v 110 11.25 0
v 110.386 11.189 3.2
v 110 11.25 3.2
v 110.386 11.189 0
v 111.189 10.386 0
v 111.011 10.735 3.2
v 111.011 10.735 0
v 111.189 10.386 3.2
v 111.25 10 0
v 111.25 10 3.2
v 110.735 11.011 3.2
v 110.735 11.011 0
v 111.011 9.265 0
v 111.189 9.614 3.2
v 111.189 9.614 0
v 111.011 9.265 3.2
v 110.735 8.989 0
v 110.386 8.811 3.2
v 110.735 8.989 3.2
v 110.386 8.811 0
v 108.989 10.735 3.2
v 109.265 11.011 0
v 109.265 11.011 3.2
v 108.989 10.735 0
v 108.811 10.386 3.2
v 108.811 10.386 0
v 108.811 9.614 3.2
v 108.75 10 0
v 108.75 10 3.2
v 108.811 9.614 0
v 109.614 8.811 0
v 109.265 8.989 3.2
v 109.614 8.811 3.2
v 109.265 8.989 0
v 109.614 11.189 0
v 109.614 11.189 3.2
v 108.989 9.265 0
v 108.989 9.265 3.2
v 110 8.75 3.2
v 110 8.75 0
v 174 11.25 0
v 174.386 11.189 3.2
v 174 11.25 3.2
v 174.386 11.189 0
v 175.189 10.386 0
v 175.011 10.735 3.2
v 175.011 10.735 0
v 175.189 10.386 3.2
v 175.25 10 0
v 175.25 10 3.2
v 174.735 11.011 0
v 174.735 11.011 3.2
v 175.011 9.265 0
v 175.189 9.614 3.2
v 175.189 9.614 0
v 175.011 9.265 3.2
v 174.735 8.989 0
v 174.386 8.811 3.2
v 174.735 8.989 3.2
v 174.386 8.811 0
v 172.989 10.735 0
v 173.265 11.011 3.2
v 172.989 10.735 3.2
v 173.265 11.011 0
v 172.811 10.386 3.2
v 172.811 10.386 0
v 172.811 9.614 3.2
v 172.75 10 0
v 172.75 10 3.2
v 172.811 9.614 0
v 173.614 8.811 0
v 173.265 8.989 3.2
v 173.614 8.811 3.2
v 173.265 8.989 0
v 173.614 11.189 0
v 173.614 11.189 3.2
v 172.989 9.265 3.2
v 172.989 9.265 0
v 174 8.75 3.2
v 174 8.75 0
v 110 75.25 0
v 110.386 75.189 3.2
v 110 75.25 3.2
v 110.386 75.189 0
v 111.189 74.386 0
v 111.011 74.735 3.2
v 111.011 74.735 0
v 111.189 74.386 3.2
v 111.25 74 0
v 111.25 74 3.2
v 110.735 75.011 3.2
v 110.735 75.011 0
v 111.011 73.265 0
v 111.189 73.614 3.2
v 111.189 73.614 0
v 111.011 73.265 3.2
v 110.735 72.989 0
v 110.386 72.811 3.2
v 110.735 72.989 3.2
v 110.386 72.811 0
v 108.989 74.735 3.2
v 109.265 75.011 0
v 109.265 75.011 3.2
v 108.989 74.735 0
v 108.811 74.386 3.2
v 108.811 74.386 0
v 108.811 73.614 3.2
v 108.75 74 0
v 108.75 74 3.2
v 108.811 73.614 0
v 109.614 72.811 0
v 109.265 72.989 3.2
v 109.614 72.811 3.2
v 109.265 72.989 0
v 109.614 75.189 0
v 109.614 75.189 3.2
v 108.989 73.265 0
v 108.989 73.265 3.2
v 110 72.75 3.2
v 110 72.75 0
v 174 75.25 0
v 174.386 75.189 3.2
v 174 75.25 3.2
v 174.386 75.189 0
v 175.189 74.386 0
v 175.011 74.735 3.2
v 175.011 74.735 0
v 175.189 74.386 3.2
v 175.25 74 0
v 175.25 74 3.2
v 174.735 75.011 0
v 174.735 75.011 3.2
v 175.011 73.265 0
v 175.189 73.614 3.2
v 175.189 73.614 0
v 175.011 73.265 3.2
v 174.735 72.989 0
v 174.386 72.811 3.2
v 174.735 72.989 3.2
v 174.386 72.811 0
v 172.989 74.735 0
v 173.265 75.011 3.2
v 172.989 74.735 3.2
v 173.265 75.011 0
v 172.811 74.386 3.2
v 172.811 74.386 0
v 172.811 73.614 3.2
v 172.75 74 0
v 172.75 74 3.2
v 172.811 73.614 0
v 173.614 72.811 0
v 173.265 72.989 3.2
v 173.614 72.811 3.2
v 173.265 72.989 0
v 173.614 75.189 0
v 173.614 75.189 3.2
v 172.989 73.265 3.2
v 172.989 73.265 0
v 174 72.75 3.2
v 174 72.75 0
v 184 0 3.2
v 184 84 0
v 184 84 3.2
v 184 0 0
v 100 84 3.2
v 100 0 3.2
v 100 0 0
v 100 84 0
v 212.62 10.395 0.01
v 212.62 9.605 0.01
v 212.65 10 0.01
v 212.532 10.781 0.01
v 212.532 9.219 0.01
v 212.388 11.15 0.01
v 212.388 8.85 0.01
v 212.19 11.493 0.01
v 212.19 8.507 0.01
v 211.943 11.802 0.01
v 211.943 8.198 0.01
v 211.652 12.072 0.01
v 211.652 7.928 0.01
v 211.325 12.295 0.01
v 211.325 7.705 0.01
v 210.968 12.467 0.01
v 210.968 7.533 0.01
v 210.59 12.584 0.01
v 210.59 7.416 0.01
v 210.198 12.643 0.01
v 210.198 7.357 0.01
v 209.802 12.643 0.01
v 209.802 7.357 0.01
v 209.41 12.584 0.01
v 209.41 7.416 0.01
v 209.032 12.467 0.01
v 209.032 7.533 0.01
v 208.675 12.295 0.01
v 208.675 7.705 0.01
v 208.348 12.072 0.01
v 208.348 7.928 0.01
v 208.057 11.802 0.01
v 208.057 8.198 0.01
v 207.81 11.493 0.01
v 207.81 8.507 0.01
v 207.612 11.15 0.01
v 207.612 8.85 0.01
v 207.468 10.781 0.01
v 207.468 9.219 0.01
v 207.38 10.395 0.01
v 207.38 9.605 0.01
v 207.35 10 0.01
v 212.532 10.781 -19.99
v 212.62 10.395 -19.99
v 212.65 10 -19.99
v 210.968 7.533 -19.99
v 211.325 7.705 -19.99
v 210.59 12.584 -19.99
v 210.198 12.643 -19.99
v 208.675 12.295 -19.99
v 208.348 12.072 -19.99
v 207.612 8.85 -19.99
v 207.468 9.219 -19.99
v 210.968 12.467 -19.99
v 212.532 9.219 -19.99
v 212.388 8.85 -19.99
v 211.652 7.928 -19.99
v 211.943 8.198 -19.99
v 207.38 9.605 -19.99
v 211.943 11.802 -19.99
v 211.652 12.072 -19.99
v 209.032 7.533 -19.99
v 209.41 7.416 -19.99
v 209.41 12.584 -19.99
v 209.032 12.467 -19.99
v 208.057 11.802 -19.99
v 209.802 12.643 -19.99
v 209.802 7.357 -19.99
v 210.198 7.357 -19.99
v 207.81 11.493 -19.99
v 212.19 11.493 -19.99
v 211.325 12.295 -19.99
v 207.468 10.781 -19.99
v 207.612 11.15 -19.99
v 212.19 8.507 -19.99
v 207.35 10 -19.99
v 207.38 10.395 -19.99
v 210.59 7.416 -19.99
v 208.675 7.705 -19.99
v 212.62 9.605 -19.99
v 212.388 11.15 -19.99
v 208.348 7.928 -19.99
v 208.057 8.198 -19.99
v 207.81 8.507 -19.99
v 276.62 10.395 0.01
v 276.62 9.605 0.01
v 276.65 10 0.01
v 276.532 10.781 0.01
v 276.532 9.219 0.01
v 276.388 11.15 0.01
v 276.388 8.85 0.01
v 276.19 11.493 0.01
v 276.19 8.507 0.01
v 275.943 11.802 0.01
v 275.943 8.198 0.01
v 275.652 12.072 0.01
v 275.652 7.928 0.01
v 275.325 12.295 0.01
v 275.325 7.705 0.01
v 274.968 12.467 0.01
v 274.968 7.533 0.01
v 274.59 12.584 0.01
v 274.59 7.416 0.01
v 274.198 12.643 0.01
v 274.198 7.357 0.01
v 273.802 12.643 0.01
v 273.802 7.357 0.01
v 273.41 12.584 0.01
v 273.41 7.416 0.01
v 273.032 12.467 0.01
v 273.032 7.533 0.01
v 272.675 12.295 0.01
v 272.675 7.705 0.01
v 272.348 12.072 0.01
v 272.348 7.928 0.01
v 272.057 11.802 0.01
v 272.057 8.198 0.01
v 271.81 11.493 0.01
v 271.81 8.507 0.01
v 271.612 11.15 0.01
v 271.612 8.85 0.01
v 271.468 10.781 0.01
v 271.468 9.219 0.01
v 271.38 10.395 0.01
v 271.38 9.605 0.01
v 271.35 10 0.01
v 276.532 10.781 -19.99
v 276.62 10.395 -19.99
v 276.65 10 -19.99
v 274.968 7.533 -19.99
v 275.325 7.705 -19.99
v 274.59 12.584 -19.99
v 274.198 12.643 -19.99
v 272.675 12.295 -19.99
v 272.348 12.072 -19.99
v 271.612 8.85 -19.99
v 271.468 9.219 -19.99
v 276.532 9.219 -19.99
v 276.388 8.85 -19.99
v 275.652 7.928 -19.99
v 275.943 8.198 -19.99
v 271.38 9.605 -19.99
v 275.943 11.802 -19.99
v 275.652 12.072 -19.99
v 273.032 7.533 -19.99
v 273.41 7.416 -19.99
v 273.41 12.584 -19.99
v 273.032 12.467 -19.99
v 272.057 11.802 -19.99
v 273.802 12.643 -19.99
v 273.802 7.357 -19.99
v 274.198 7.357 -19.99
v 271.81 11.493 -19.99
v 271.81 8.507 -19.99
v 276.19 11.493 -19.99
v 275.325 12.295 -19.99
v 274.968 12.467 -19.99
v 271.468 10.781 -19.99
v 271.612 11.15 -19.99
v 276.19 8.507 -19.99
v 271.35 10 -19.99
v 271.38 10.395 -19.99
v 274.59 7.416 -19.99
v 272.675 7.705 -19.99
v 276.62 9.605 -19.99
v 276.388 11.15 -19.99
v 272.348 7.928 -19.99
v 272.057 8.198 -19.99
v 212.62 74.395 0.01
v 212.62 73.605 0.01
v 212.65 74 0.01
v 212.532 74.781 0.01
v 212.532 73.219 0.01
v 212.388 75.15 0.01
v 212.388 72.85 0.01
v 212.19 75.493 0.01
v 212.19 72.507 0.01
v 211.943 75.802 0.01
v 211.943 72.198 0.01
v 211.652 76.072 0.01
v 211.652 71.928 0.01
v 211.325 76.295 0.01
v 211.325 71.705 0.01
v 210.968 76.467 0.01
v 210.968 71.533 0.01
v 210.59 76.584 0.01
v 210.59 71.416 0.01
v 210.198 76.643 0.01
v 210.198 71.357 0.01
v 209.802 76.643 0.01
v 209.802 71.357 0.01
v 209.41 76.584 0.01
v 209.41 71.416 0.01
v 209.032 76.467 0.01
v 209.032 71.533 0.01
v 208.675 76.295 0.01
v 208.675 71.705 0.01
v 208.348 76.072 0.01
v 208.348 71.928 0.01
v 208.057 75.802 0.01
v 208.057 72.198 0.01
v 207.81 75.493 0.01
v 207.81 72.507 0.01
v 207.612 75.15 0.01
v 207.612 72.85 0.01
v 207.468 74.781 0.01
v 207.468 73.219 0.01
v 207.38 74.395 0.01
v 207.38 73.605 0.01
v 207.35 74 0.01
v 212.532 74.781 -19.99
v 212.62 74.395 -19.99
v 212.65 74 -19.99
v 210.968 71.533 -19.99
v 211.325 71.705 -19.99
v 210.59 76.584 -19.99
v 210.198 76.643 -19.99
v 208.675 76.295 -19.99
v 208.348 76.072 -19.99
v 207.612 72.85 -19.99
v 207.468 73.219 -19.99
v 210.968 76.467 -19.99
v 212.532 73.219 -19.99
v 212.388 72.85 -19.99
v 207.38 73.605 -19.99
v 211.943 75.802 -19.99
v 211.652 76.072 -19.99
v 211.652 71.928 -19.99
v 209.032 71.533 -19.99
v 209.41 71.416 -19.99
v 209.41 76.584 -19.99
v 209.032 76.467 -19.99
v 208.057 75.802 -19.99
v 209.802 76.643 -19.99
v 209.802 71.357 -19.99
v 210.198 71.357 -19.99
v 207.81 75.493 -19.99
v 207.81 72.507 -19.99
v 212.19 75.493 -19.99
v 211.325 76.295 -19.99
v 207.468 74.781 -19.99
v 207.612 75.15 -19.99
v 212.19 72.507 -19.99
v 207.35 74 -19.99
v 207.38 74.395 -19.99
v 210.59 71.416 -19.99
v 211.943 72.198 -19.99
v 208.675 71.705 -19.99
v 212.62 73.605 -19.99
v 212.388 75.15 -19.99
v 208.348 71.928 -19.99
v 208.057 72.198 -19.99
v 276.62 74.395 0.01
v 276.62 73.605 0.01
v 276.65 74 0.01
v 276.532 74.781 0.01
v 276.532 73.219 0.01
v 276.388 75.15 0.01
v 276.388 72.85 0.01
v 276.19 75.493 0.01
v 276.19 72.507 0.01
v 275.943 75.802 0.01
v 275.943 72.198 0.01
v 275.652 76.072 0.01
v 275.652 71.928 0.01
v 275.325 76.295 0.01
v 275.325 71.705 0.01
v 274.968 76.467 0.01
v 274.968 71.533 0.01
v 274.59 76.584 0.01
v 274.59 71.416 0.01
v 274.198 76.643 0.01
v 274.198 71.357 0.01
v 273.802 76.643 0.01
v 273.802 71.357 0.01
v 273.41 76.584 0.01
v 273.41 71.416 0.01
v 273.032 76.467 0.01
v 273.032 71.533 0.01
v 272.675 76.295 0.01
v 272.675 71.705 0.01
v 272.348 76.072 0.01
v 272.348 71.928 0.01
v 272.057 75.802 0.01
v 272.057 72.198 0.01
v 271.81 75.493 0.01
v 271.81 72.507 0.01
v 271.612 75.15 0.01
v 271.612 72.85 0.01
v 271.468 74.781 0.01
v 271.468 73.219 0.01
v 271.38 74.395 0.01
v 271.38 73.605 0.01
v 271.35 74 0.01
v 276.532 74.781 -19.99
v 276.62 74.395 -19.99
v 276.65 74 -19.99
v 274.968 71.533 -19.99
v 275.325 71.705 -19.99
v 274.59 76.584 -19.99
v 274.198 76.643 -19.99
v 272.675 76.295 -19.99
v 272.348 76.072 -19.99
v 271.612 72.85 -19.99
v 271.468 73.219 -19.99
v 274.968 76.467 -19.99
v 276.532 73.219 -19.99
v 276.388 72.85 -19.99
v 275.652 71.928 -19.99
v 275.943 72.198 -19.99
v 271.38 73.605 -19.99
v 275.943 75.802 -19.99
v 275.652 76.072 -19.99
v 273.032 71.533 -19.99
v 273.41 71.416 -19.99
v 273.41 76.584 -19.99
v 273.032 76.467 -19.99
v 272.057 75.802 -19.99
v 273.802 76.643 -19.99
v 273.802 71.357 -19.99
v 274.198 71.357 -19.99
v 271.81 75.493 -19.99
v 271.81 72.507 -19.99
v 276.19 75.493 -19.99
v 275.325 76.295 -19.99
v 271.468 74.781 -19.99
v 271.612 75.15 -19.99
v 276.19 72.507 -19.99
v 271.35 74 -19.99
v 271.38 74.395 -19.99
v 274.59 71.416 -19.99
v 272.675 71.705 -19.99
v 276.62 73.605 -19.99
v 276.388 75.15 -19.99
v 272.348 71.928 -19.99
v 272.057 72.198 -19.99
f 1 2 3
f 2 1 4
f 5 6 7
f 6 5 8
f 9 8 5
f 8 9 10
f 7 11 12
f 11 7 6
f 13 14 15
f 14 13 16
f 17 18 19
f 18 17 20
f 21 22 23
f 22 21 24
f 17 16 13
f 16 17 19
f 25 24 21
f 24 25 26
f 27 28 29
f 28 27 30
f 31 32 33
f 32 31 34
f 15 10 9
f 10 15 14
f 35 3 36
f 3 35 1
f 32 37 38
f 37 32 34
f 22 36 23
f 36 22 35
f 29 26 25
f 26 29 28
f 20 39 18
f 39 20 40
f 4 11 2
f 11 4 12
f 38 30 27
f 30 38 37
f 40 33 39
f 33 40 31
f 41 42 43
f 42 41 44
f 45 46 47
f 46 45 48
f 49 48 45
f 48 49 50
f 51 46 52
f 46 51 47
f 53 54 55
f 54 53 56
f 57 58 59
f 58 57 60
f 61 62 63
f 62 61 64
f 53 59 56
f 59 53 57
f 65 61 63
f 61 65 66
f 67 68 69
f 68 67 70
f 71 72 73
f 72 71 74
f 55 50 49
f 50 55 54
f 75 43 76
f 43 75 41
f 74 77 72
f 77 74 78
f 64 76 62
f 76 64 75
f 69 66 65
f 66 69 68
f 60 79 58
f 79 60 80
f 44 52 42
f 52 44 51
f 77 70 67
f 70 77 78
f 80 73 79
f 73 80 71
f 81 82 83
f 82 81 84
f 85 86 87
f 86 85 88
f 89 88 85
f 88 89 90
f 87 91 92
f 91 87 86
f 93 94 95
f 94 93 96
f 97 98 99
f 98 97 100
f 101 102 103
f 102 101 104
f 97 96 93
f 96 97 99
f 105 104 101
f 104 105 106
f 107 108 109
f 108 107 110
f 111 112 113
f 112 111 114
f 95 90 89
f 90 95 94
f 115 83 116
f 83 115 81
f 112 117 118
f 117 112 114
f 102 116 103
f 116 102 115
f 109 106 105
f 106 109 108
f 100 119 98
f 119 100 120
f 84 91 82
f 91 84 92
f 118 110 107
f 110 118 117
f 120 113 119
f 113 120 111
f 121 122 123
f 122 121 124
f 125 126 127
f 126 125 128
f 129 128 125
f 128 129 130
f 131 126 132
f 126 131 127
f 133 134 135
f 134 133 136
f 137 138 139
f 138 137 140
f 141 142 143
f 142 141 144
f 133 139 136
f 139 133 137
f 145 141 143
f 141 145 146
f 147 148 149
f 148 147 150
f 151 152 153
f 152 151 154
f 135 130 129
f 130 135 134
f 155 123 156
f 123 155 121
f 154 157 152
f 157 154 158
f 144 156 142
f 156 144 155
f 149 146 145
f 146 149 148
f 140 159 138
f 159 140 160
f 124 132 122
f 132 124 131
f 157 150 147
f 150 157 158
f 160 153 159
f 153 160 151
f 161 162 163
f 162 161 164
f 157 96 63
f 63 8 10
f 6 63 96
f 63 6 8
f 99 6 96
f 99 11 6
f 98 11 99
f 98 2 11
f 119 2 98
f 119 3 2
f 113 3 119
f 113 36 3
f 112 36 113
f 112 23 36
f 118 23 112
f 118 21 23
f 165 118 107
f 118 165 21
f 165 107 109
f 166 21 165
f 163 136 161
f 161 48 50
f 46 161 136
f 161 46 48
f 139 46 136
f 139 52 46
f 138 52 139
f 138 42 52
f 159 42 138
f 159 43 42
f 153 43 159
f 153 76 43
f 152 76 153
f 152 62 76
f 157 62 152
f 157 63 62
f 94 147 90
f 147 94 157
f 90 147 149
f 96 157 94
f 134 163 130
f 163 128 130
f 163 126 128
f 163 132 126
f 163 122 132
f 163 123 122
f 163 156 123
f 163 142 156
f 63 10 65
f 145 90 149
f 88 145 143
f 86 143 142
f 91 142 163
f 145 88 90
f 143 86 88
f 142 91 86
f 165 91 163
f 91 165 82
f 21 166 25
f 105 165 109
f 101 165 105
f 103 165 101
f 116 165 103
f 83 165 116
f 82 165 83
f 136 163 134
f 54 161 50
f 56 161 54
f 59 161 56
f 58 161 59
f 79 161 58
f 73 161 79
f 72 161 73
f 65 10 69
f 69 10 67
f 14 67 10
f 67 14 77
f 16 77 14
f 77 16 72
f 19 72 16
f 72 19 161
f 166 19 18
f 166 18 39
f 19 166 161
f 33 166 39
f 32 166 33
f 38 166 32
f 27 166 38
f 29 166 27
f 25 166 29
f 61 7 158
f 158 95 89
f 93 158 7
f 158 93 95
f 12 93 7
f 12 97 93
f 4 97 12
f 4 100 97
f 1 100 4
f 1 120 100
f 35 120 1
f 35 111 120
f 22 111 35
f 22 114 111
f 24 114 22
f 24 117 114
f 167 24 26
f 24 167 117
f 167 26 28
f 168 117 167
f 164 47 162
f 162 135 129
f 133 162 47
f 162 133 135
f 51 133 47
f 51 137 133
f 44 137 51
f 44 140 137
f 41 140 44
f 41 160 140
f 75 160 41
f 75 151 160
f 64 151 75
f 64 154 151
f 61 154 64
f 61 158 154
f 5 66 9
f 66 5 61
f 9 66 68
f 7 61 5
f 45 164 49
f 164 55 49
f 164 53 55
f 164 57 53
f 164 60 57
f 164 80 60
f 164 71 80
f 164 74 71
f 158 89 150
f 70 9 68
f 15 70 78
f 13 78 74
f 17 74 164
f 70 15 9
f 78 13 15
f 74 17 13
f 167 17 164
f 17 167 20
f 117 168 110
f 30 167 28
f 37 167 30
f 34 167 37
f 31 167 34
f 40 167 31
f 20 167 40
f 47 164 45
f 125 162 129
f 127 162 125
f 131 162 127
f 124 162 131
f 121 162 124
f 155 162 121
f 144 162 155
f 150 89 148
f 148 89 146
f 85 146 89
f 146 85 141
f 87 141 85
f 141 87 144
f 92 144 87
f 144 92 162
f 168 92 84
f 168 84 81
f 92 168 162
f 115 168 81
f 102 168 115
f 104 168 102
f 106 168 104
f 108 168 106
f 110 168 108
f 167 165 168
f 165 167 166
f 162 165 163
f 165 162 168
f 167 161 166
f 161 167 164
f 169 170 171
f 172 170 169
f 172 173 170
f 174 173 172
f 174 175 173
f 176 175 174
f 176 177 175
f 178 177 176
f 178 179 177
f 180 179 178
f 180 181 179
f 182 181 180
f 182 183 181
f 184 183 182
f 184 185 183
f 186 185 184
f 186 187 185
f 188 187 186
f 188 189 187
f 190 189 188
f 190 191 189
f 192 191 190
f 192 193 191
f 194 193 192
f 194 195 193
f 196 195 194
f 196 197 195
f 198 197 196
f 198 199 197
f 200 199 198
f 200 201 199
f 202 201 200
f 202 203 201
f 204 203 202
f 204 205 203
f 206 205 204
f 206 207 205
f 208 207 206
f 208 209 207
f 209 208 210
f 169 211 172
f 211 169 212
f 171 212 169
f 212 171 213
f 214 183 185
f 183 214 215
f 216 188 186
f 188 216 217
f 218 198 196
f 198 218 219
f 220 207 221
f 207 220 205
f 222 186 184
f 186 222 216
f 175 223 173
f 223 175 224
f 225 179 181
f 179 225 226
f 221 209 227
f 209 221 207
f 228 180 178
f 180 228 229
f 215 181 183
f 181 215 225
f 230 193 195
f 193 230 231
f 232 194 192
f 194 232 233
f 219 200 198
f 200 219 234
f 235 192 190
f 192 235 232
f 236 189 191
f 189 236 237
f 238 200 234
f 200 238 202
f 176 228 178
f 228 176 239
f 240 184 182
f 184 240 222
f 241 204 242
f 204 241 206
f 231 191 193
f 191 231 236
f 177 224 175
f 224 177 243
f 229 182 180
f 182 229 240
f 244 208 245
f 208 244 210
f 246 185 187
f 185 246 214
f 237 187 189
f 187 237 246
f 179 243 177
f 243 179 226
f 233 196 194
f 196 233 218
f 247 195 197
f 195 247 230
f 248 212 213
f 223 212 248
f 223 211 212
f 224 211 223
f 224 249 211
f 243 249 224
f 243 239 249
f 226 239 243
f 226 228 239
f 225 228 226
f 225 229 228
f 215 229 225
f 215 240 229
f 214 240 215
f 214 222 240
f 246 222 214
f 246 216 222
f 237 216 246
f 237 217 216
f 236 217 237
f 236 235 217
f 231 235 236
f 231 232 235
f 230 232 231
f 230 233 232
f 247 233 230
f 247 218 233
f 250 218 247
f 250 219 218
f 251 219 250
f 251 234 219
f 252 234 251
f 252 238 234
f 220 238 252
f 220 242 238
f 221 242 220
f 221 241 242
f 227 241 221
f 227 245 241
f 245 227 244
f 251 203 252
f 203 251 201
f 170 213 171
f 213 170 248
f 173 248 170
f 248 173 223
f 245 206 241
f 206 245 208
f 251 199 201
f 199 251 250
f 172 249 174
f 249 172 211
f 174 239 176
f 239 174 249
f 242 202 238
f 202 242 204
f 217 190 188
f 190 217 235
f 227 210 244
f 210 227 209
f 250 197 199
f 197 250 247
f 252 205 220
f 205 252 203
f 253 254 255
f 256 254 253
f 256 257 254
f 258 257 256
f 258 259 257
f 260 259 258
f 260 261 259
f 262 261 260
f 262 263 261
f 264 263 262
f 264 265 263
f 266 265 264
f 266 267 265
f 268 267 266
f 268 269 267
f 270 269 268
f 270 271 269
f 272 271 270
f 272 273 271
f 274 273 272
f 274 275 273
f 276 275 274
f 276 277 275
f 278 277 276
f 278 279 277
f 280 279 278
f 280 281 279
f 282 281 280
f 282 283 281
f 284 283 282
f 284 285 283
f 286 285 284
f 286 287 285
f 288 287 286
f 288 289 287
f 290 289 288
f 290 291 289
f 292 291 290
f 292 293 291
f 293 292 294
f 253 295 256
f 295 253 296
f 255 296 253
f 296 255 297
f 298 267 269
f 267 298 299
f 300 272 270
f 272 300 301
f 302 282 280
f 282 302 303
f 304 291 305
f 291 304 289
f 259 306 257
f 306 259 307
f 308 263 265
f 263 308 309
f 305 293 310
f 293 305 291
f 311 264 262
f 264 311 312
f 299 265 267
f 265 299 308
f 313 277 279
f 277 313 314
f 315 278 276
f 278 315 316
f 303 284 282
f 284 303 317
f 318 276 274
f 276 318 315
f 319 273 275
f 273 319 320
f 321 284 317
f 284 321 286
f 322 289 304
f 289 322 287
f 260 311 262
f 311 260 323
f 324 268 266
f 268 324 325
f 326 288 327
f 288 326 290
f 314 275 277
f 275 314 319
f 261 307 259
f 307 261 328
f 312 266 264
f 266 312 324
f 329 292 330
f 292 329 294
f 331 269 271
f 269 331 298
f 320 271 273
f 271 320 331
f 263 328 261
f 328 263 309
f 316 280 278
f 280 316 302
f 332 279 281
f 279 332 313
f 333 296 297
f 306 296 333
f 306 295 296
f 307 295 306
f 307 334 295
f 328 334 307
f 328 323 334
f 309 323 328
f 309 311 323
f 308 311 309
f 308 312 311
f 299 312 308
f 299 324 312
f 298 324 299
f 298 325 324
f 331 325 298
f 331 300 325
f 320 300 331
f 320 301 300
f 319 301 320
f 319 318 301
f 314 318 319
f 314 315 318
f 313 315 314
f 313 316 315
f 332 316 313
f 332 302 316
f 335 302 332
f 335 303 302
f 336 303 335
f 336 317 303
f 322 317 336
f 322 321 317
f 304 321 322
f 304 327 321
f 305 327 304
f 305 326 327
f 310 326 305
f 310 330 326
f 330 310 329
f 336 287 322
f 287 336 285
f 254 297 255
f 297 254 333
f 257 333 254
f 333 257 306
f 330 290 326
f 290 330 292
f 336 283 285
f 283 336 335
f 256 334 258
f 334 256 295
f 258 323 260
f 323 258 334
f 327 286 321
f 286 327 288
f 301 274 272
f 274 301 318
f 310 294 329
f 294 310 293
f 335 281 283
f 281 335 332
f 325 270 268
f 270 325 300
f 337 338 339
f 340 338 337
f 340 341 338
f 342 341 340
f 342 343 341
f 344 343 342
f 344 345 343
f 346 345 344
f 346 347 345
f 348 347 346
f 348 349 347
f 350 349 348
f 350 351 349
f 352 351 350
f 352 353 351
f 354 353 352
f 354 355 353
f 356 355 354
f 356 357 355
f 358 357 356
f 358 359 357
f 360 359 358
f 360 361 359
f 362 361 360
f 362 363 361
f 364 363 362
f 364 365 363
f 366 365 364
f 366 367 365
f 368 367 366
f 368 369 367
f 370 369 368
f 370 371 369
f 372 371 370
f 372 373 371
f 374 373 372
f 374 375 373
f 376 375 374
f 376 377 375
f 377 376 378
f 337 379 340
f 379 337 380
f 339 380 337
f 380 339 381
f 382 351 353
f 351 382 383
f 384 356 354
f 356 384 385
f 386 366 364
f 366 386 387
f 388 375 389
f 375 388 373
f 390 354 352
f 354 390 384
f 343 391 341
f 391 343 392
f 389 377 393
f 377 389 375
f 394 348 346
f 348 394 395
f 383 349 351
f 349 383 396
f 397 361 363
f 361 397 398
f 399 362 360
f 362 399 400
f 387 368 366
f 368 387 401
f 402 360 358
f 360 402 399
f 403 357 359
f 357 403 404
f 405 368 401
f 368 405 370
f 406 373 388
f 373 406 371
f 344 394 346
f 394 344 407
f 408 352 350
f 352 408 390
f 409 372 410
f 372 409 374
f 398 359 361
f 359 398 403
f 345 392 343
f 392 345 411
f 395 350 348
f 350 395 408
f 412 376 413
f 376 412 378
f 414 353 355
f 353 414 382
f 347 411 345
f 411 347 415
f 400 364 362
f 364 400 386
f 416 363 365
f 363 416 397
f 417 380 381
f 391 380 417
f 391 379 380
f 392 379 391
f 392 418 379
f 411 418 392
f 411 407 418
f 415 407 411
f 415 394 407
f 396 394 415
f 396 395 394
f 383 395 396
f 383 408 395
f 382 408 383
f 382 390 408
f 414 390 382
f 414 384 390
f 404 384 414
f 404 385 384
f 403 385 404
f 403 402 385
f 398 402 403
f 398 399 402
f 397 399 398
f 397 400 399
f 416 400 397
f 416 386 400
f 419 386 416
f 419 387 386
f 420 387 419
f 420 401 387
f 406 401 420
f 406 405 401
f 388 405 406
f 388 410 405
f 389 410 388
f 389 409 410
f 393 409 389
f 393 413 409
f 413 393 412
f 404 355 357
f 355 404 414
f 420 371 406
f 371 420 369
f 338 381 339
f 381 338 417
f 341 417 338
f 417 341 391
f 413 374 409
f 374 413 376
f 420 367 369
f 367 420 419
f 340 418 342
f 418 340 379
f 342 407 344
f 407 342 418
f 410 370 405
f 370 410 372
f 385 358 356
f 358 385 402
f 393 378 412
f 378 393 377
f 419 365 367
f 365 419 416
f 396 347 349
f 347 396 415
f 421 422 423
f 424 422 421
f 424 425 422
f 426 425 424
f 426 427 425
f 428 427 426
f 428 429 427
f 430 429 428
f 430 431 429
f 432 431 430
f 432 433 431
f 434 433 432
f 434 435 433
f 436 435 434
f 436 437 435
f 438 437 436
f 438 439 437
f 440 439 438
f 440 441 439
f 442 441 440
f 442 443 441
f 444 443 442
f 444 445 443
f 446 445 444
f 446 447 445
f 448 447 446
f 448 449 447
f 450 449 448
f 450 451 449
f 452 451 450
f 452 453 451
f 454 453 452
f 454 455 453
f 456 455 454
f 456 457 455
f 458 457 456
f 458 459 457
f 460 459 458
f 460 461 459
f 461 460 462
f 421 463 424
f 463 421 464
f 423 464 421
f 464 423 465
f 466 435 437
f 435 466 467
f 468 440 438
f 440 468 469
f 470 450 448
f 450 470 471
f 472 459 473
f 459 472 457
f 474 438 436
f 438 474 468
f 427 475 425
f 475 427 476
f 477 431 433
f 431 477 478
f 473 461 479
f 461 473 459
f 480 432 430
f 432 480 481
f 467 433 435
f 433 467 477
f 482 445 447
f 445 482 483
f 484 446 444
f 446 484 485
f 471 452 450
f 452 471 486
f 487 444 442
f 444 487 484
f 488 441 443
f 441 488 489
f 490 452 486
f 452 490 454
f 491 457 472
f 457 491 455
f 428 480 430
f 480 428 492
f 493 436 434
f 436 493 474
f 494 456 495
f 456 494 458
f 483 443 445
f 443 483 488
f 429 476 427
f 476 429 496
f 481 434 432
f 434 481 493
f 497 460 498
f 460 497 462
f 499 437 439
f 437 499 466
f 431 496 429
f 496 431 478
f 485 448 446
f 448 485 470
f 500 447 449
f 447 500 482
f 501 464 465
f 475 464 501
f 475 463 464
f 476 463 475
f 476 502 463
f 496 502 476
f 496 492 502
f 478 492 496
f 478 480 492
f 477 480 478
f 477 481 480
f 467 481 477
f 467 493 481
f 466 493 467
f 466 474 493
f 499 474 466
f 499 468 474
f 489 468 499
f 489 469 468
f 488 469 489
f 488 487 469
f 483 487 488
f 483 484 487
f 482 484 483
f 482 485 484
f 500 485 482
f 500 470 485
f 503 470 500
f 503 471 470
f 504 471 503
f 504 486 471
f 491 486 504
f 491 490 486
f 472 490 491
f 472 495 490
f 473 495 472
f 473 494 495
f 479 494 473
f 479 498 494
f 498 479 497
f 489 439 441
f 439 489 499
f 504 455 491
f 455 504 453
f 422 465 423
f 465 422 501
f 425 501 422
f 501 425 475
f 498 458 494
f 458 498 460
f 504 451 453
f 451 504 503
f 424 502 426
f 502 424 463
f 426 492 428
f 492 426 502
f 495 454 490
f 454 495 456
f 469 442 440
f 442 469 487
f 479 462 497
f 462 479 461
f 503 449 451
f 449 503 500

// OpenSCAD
// file: parameters.scad
// ============================================================
// Global rendering
// ============================================================
// Facet quality (global). $fs holds constant surface smoothness across sizes;
// $fa caps facet count on large radii. OpenSCAD uses whichever yields more.
$fa = 1;
$fs = 0.4;

eps = 0.01;

// Fit clearance applied to mating parts.
tolerance = 0.3;

// ============================================================
// Wedge (front-to-back taper)
// ============================================================
wedge_angle = 2;

// ============================================================
// Threaded inserts
// ============================================================
threaded_insert_diameter = 5;
threaded_insert_depth = 6;
threaded_insert_vertical_spacing = 2;
threaded_insert_post_diameter = threaded_insert_diameter + 5;

// ============================================================
// Walls
// ============================================================
wall_depth = 5;
top_and_bottom_wall_depth = 3.5;

// ============================================================
// Base dimensions (independent)
// Interior and exterior interconnect, so base values come first,
// then the derived values below.
// ============================================================
exterior_width = 255;
exterior_height = 211;
interior_depth = 28;

// ============================================================
// Derived dimensions
// ============================================================
// Interior <- exterior width/height
interior_width = exterior_width - (wall_depth * 2);
interior_height = exterior_height - (wall_depth * 2);
interior_front_depth = interior_depth;
interior_back_depth = (exterior_height * tan(wedge_angle)) + interior_front_depth;

// Exterior depth <- interior_depth
exterior_front_depth = interior_depth + (top_and_bottom_wall_depth * 2);
exterior_back_depth = (exterior_height * tan(wedge_angle)) + exterior_front_depth;

// ============================================================
// Keyboard
// ============================================================
keyboard_width = 230;
keyboard_height = 78;

keyboard_x = (exterior_width / 2) - (keyboard_width / 2) - wall_depth;
keyboard_y = 20;

// ============================================================
// Battery
// ============================================================
battery_pack_width = 87;
battery_pack_height = 63.65;

battery_x = interior_width - (battery_pack_width) - 15;
battery_y = interior_height - (battery_pack_height) - 16;

battery_pack_cover_width = battery_pack_width + 6;
battery_pack_cover_height = battery_pack_height + 6;

// ============================================================
// Screen
// ============================================================
screen_width = 84;
screen_height = 84;

// This is the depth of the screen + Pi
// Called it _to_mount because this is the amount of space from the top of the case to the mount posts
screen_depth_to_mount = 24.80;

screen_x = 20;
screen_y = interior_height - (screen_height) - 5;

screen_screw_thread_diameter = 2.5;
screen_screw_head_diameter = 4;
screen_screw_washer_diameter = 5;
screen_screw_thread_length = 8;

// This should include the washer depth as well
screen_screw_head_depth = 3.85;


// ============================================================
// Hub
// ============================================================

hub_board_height = 61.45;
hub_board_width = 25.40;
hub_usb_port_width = 13.25;
hub_usb_port_depth = 6;
hub_usb_port_length = 10;

hub_usb_port_mount_height = 7.5;
hub_usb_port_cutout_depth = 10;
// main file
include <parameters.scad>

screen_mount_depth = interior_depth - screen_depth_to_mount;

screw_hole_positions = [
    [10, 10, 0],
    [screen_width - 10, 10, 0],
    [10, screen_height - 10, 0],
    [screen_width - 10, screen_height - 10, 0]
];


module screen_cutout() {
    cube([screen_width, screen_height, 100]);
}

// Screw driven from the OUTSIDE bottom of the case, up through the bottom wall
// to meet the base of the standoff. A single washer-wide pocket clears the
// whole (wedge-tilted, non-uniform) wall; the screw threads engage the standoff
// above, whose hole is cut by screw_holes() in screen_mount().
//
// This MUST be placed inside interior_cutout_translate (same as screen_mount)
// so it inherits the 2 deg wedge skew and stays collinear with the standoff's
// screw axis. In that frame the standoff base is local z = 0.
screen_bottom_hole_overshoot = 20;  // generous; clipped by the outer skin

module screen_mount_bottom_holes() {
    for (i = screw_hole_positions) {
        // Overshoot below the outer face (trimmed by the body), top at z = 0 so
        // the pocket meets the standoff base without hollowing its threads.
        translate([i[0], i[1], -screen_bottom_hole_overshoot + eps])
            cylinder(h = screen_bottom_hole_overshoot,
                     r = (screen_screw_washer_diameter + tolerance) / 2);
    }
}


module screw_holes() {
    for (i = screw_hole_positions) {
        x = i[0];
        y = i[1];
        translate([i[0], i[1], i[2] - eps])
            color("yellow")
            cylinder(h=screen_mount_depth + (eps * 2), r = screen_screw_thread_diameter / 2);
    }
}

module screen_mount() {
    difference() {
        cube([screen_width, screen_height, screen_mount_depth]);
        screw_holes();
    }
}

%screen_cutout();
translate([100, 0, 0]) screen_mount();
translate([200, 0, 0]) screen_mount_bottom_holes();
